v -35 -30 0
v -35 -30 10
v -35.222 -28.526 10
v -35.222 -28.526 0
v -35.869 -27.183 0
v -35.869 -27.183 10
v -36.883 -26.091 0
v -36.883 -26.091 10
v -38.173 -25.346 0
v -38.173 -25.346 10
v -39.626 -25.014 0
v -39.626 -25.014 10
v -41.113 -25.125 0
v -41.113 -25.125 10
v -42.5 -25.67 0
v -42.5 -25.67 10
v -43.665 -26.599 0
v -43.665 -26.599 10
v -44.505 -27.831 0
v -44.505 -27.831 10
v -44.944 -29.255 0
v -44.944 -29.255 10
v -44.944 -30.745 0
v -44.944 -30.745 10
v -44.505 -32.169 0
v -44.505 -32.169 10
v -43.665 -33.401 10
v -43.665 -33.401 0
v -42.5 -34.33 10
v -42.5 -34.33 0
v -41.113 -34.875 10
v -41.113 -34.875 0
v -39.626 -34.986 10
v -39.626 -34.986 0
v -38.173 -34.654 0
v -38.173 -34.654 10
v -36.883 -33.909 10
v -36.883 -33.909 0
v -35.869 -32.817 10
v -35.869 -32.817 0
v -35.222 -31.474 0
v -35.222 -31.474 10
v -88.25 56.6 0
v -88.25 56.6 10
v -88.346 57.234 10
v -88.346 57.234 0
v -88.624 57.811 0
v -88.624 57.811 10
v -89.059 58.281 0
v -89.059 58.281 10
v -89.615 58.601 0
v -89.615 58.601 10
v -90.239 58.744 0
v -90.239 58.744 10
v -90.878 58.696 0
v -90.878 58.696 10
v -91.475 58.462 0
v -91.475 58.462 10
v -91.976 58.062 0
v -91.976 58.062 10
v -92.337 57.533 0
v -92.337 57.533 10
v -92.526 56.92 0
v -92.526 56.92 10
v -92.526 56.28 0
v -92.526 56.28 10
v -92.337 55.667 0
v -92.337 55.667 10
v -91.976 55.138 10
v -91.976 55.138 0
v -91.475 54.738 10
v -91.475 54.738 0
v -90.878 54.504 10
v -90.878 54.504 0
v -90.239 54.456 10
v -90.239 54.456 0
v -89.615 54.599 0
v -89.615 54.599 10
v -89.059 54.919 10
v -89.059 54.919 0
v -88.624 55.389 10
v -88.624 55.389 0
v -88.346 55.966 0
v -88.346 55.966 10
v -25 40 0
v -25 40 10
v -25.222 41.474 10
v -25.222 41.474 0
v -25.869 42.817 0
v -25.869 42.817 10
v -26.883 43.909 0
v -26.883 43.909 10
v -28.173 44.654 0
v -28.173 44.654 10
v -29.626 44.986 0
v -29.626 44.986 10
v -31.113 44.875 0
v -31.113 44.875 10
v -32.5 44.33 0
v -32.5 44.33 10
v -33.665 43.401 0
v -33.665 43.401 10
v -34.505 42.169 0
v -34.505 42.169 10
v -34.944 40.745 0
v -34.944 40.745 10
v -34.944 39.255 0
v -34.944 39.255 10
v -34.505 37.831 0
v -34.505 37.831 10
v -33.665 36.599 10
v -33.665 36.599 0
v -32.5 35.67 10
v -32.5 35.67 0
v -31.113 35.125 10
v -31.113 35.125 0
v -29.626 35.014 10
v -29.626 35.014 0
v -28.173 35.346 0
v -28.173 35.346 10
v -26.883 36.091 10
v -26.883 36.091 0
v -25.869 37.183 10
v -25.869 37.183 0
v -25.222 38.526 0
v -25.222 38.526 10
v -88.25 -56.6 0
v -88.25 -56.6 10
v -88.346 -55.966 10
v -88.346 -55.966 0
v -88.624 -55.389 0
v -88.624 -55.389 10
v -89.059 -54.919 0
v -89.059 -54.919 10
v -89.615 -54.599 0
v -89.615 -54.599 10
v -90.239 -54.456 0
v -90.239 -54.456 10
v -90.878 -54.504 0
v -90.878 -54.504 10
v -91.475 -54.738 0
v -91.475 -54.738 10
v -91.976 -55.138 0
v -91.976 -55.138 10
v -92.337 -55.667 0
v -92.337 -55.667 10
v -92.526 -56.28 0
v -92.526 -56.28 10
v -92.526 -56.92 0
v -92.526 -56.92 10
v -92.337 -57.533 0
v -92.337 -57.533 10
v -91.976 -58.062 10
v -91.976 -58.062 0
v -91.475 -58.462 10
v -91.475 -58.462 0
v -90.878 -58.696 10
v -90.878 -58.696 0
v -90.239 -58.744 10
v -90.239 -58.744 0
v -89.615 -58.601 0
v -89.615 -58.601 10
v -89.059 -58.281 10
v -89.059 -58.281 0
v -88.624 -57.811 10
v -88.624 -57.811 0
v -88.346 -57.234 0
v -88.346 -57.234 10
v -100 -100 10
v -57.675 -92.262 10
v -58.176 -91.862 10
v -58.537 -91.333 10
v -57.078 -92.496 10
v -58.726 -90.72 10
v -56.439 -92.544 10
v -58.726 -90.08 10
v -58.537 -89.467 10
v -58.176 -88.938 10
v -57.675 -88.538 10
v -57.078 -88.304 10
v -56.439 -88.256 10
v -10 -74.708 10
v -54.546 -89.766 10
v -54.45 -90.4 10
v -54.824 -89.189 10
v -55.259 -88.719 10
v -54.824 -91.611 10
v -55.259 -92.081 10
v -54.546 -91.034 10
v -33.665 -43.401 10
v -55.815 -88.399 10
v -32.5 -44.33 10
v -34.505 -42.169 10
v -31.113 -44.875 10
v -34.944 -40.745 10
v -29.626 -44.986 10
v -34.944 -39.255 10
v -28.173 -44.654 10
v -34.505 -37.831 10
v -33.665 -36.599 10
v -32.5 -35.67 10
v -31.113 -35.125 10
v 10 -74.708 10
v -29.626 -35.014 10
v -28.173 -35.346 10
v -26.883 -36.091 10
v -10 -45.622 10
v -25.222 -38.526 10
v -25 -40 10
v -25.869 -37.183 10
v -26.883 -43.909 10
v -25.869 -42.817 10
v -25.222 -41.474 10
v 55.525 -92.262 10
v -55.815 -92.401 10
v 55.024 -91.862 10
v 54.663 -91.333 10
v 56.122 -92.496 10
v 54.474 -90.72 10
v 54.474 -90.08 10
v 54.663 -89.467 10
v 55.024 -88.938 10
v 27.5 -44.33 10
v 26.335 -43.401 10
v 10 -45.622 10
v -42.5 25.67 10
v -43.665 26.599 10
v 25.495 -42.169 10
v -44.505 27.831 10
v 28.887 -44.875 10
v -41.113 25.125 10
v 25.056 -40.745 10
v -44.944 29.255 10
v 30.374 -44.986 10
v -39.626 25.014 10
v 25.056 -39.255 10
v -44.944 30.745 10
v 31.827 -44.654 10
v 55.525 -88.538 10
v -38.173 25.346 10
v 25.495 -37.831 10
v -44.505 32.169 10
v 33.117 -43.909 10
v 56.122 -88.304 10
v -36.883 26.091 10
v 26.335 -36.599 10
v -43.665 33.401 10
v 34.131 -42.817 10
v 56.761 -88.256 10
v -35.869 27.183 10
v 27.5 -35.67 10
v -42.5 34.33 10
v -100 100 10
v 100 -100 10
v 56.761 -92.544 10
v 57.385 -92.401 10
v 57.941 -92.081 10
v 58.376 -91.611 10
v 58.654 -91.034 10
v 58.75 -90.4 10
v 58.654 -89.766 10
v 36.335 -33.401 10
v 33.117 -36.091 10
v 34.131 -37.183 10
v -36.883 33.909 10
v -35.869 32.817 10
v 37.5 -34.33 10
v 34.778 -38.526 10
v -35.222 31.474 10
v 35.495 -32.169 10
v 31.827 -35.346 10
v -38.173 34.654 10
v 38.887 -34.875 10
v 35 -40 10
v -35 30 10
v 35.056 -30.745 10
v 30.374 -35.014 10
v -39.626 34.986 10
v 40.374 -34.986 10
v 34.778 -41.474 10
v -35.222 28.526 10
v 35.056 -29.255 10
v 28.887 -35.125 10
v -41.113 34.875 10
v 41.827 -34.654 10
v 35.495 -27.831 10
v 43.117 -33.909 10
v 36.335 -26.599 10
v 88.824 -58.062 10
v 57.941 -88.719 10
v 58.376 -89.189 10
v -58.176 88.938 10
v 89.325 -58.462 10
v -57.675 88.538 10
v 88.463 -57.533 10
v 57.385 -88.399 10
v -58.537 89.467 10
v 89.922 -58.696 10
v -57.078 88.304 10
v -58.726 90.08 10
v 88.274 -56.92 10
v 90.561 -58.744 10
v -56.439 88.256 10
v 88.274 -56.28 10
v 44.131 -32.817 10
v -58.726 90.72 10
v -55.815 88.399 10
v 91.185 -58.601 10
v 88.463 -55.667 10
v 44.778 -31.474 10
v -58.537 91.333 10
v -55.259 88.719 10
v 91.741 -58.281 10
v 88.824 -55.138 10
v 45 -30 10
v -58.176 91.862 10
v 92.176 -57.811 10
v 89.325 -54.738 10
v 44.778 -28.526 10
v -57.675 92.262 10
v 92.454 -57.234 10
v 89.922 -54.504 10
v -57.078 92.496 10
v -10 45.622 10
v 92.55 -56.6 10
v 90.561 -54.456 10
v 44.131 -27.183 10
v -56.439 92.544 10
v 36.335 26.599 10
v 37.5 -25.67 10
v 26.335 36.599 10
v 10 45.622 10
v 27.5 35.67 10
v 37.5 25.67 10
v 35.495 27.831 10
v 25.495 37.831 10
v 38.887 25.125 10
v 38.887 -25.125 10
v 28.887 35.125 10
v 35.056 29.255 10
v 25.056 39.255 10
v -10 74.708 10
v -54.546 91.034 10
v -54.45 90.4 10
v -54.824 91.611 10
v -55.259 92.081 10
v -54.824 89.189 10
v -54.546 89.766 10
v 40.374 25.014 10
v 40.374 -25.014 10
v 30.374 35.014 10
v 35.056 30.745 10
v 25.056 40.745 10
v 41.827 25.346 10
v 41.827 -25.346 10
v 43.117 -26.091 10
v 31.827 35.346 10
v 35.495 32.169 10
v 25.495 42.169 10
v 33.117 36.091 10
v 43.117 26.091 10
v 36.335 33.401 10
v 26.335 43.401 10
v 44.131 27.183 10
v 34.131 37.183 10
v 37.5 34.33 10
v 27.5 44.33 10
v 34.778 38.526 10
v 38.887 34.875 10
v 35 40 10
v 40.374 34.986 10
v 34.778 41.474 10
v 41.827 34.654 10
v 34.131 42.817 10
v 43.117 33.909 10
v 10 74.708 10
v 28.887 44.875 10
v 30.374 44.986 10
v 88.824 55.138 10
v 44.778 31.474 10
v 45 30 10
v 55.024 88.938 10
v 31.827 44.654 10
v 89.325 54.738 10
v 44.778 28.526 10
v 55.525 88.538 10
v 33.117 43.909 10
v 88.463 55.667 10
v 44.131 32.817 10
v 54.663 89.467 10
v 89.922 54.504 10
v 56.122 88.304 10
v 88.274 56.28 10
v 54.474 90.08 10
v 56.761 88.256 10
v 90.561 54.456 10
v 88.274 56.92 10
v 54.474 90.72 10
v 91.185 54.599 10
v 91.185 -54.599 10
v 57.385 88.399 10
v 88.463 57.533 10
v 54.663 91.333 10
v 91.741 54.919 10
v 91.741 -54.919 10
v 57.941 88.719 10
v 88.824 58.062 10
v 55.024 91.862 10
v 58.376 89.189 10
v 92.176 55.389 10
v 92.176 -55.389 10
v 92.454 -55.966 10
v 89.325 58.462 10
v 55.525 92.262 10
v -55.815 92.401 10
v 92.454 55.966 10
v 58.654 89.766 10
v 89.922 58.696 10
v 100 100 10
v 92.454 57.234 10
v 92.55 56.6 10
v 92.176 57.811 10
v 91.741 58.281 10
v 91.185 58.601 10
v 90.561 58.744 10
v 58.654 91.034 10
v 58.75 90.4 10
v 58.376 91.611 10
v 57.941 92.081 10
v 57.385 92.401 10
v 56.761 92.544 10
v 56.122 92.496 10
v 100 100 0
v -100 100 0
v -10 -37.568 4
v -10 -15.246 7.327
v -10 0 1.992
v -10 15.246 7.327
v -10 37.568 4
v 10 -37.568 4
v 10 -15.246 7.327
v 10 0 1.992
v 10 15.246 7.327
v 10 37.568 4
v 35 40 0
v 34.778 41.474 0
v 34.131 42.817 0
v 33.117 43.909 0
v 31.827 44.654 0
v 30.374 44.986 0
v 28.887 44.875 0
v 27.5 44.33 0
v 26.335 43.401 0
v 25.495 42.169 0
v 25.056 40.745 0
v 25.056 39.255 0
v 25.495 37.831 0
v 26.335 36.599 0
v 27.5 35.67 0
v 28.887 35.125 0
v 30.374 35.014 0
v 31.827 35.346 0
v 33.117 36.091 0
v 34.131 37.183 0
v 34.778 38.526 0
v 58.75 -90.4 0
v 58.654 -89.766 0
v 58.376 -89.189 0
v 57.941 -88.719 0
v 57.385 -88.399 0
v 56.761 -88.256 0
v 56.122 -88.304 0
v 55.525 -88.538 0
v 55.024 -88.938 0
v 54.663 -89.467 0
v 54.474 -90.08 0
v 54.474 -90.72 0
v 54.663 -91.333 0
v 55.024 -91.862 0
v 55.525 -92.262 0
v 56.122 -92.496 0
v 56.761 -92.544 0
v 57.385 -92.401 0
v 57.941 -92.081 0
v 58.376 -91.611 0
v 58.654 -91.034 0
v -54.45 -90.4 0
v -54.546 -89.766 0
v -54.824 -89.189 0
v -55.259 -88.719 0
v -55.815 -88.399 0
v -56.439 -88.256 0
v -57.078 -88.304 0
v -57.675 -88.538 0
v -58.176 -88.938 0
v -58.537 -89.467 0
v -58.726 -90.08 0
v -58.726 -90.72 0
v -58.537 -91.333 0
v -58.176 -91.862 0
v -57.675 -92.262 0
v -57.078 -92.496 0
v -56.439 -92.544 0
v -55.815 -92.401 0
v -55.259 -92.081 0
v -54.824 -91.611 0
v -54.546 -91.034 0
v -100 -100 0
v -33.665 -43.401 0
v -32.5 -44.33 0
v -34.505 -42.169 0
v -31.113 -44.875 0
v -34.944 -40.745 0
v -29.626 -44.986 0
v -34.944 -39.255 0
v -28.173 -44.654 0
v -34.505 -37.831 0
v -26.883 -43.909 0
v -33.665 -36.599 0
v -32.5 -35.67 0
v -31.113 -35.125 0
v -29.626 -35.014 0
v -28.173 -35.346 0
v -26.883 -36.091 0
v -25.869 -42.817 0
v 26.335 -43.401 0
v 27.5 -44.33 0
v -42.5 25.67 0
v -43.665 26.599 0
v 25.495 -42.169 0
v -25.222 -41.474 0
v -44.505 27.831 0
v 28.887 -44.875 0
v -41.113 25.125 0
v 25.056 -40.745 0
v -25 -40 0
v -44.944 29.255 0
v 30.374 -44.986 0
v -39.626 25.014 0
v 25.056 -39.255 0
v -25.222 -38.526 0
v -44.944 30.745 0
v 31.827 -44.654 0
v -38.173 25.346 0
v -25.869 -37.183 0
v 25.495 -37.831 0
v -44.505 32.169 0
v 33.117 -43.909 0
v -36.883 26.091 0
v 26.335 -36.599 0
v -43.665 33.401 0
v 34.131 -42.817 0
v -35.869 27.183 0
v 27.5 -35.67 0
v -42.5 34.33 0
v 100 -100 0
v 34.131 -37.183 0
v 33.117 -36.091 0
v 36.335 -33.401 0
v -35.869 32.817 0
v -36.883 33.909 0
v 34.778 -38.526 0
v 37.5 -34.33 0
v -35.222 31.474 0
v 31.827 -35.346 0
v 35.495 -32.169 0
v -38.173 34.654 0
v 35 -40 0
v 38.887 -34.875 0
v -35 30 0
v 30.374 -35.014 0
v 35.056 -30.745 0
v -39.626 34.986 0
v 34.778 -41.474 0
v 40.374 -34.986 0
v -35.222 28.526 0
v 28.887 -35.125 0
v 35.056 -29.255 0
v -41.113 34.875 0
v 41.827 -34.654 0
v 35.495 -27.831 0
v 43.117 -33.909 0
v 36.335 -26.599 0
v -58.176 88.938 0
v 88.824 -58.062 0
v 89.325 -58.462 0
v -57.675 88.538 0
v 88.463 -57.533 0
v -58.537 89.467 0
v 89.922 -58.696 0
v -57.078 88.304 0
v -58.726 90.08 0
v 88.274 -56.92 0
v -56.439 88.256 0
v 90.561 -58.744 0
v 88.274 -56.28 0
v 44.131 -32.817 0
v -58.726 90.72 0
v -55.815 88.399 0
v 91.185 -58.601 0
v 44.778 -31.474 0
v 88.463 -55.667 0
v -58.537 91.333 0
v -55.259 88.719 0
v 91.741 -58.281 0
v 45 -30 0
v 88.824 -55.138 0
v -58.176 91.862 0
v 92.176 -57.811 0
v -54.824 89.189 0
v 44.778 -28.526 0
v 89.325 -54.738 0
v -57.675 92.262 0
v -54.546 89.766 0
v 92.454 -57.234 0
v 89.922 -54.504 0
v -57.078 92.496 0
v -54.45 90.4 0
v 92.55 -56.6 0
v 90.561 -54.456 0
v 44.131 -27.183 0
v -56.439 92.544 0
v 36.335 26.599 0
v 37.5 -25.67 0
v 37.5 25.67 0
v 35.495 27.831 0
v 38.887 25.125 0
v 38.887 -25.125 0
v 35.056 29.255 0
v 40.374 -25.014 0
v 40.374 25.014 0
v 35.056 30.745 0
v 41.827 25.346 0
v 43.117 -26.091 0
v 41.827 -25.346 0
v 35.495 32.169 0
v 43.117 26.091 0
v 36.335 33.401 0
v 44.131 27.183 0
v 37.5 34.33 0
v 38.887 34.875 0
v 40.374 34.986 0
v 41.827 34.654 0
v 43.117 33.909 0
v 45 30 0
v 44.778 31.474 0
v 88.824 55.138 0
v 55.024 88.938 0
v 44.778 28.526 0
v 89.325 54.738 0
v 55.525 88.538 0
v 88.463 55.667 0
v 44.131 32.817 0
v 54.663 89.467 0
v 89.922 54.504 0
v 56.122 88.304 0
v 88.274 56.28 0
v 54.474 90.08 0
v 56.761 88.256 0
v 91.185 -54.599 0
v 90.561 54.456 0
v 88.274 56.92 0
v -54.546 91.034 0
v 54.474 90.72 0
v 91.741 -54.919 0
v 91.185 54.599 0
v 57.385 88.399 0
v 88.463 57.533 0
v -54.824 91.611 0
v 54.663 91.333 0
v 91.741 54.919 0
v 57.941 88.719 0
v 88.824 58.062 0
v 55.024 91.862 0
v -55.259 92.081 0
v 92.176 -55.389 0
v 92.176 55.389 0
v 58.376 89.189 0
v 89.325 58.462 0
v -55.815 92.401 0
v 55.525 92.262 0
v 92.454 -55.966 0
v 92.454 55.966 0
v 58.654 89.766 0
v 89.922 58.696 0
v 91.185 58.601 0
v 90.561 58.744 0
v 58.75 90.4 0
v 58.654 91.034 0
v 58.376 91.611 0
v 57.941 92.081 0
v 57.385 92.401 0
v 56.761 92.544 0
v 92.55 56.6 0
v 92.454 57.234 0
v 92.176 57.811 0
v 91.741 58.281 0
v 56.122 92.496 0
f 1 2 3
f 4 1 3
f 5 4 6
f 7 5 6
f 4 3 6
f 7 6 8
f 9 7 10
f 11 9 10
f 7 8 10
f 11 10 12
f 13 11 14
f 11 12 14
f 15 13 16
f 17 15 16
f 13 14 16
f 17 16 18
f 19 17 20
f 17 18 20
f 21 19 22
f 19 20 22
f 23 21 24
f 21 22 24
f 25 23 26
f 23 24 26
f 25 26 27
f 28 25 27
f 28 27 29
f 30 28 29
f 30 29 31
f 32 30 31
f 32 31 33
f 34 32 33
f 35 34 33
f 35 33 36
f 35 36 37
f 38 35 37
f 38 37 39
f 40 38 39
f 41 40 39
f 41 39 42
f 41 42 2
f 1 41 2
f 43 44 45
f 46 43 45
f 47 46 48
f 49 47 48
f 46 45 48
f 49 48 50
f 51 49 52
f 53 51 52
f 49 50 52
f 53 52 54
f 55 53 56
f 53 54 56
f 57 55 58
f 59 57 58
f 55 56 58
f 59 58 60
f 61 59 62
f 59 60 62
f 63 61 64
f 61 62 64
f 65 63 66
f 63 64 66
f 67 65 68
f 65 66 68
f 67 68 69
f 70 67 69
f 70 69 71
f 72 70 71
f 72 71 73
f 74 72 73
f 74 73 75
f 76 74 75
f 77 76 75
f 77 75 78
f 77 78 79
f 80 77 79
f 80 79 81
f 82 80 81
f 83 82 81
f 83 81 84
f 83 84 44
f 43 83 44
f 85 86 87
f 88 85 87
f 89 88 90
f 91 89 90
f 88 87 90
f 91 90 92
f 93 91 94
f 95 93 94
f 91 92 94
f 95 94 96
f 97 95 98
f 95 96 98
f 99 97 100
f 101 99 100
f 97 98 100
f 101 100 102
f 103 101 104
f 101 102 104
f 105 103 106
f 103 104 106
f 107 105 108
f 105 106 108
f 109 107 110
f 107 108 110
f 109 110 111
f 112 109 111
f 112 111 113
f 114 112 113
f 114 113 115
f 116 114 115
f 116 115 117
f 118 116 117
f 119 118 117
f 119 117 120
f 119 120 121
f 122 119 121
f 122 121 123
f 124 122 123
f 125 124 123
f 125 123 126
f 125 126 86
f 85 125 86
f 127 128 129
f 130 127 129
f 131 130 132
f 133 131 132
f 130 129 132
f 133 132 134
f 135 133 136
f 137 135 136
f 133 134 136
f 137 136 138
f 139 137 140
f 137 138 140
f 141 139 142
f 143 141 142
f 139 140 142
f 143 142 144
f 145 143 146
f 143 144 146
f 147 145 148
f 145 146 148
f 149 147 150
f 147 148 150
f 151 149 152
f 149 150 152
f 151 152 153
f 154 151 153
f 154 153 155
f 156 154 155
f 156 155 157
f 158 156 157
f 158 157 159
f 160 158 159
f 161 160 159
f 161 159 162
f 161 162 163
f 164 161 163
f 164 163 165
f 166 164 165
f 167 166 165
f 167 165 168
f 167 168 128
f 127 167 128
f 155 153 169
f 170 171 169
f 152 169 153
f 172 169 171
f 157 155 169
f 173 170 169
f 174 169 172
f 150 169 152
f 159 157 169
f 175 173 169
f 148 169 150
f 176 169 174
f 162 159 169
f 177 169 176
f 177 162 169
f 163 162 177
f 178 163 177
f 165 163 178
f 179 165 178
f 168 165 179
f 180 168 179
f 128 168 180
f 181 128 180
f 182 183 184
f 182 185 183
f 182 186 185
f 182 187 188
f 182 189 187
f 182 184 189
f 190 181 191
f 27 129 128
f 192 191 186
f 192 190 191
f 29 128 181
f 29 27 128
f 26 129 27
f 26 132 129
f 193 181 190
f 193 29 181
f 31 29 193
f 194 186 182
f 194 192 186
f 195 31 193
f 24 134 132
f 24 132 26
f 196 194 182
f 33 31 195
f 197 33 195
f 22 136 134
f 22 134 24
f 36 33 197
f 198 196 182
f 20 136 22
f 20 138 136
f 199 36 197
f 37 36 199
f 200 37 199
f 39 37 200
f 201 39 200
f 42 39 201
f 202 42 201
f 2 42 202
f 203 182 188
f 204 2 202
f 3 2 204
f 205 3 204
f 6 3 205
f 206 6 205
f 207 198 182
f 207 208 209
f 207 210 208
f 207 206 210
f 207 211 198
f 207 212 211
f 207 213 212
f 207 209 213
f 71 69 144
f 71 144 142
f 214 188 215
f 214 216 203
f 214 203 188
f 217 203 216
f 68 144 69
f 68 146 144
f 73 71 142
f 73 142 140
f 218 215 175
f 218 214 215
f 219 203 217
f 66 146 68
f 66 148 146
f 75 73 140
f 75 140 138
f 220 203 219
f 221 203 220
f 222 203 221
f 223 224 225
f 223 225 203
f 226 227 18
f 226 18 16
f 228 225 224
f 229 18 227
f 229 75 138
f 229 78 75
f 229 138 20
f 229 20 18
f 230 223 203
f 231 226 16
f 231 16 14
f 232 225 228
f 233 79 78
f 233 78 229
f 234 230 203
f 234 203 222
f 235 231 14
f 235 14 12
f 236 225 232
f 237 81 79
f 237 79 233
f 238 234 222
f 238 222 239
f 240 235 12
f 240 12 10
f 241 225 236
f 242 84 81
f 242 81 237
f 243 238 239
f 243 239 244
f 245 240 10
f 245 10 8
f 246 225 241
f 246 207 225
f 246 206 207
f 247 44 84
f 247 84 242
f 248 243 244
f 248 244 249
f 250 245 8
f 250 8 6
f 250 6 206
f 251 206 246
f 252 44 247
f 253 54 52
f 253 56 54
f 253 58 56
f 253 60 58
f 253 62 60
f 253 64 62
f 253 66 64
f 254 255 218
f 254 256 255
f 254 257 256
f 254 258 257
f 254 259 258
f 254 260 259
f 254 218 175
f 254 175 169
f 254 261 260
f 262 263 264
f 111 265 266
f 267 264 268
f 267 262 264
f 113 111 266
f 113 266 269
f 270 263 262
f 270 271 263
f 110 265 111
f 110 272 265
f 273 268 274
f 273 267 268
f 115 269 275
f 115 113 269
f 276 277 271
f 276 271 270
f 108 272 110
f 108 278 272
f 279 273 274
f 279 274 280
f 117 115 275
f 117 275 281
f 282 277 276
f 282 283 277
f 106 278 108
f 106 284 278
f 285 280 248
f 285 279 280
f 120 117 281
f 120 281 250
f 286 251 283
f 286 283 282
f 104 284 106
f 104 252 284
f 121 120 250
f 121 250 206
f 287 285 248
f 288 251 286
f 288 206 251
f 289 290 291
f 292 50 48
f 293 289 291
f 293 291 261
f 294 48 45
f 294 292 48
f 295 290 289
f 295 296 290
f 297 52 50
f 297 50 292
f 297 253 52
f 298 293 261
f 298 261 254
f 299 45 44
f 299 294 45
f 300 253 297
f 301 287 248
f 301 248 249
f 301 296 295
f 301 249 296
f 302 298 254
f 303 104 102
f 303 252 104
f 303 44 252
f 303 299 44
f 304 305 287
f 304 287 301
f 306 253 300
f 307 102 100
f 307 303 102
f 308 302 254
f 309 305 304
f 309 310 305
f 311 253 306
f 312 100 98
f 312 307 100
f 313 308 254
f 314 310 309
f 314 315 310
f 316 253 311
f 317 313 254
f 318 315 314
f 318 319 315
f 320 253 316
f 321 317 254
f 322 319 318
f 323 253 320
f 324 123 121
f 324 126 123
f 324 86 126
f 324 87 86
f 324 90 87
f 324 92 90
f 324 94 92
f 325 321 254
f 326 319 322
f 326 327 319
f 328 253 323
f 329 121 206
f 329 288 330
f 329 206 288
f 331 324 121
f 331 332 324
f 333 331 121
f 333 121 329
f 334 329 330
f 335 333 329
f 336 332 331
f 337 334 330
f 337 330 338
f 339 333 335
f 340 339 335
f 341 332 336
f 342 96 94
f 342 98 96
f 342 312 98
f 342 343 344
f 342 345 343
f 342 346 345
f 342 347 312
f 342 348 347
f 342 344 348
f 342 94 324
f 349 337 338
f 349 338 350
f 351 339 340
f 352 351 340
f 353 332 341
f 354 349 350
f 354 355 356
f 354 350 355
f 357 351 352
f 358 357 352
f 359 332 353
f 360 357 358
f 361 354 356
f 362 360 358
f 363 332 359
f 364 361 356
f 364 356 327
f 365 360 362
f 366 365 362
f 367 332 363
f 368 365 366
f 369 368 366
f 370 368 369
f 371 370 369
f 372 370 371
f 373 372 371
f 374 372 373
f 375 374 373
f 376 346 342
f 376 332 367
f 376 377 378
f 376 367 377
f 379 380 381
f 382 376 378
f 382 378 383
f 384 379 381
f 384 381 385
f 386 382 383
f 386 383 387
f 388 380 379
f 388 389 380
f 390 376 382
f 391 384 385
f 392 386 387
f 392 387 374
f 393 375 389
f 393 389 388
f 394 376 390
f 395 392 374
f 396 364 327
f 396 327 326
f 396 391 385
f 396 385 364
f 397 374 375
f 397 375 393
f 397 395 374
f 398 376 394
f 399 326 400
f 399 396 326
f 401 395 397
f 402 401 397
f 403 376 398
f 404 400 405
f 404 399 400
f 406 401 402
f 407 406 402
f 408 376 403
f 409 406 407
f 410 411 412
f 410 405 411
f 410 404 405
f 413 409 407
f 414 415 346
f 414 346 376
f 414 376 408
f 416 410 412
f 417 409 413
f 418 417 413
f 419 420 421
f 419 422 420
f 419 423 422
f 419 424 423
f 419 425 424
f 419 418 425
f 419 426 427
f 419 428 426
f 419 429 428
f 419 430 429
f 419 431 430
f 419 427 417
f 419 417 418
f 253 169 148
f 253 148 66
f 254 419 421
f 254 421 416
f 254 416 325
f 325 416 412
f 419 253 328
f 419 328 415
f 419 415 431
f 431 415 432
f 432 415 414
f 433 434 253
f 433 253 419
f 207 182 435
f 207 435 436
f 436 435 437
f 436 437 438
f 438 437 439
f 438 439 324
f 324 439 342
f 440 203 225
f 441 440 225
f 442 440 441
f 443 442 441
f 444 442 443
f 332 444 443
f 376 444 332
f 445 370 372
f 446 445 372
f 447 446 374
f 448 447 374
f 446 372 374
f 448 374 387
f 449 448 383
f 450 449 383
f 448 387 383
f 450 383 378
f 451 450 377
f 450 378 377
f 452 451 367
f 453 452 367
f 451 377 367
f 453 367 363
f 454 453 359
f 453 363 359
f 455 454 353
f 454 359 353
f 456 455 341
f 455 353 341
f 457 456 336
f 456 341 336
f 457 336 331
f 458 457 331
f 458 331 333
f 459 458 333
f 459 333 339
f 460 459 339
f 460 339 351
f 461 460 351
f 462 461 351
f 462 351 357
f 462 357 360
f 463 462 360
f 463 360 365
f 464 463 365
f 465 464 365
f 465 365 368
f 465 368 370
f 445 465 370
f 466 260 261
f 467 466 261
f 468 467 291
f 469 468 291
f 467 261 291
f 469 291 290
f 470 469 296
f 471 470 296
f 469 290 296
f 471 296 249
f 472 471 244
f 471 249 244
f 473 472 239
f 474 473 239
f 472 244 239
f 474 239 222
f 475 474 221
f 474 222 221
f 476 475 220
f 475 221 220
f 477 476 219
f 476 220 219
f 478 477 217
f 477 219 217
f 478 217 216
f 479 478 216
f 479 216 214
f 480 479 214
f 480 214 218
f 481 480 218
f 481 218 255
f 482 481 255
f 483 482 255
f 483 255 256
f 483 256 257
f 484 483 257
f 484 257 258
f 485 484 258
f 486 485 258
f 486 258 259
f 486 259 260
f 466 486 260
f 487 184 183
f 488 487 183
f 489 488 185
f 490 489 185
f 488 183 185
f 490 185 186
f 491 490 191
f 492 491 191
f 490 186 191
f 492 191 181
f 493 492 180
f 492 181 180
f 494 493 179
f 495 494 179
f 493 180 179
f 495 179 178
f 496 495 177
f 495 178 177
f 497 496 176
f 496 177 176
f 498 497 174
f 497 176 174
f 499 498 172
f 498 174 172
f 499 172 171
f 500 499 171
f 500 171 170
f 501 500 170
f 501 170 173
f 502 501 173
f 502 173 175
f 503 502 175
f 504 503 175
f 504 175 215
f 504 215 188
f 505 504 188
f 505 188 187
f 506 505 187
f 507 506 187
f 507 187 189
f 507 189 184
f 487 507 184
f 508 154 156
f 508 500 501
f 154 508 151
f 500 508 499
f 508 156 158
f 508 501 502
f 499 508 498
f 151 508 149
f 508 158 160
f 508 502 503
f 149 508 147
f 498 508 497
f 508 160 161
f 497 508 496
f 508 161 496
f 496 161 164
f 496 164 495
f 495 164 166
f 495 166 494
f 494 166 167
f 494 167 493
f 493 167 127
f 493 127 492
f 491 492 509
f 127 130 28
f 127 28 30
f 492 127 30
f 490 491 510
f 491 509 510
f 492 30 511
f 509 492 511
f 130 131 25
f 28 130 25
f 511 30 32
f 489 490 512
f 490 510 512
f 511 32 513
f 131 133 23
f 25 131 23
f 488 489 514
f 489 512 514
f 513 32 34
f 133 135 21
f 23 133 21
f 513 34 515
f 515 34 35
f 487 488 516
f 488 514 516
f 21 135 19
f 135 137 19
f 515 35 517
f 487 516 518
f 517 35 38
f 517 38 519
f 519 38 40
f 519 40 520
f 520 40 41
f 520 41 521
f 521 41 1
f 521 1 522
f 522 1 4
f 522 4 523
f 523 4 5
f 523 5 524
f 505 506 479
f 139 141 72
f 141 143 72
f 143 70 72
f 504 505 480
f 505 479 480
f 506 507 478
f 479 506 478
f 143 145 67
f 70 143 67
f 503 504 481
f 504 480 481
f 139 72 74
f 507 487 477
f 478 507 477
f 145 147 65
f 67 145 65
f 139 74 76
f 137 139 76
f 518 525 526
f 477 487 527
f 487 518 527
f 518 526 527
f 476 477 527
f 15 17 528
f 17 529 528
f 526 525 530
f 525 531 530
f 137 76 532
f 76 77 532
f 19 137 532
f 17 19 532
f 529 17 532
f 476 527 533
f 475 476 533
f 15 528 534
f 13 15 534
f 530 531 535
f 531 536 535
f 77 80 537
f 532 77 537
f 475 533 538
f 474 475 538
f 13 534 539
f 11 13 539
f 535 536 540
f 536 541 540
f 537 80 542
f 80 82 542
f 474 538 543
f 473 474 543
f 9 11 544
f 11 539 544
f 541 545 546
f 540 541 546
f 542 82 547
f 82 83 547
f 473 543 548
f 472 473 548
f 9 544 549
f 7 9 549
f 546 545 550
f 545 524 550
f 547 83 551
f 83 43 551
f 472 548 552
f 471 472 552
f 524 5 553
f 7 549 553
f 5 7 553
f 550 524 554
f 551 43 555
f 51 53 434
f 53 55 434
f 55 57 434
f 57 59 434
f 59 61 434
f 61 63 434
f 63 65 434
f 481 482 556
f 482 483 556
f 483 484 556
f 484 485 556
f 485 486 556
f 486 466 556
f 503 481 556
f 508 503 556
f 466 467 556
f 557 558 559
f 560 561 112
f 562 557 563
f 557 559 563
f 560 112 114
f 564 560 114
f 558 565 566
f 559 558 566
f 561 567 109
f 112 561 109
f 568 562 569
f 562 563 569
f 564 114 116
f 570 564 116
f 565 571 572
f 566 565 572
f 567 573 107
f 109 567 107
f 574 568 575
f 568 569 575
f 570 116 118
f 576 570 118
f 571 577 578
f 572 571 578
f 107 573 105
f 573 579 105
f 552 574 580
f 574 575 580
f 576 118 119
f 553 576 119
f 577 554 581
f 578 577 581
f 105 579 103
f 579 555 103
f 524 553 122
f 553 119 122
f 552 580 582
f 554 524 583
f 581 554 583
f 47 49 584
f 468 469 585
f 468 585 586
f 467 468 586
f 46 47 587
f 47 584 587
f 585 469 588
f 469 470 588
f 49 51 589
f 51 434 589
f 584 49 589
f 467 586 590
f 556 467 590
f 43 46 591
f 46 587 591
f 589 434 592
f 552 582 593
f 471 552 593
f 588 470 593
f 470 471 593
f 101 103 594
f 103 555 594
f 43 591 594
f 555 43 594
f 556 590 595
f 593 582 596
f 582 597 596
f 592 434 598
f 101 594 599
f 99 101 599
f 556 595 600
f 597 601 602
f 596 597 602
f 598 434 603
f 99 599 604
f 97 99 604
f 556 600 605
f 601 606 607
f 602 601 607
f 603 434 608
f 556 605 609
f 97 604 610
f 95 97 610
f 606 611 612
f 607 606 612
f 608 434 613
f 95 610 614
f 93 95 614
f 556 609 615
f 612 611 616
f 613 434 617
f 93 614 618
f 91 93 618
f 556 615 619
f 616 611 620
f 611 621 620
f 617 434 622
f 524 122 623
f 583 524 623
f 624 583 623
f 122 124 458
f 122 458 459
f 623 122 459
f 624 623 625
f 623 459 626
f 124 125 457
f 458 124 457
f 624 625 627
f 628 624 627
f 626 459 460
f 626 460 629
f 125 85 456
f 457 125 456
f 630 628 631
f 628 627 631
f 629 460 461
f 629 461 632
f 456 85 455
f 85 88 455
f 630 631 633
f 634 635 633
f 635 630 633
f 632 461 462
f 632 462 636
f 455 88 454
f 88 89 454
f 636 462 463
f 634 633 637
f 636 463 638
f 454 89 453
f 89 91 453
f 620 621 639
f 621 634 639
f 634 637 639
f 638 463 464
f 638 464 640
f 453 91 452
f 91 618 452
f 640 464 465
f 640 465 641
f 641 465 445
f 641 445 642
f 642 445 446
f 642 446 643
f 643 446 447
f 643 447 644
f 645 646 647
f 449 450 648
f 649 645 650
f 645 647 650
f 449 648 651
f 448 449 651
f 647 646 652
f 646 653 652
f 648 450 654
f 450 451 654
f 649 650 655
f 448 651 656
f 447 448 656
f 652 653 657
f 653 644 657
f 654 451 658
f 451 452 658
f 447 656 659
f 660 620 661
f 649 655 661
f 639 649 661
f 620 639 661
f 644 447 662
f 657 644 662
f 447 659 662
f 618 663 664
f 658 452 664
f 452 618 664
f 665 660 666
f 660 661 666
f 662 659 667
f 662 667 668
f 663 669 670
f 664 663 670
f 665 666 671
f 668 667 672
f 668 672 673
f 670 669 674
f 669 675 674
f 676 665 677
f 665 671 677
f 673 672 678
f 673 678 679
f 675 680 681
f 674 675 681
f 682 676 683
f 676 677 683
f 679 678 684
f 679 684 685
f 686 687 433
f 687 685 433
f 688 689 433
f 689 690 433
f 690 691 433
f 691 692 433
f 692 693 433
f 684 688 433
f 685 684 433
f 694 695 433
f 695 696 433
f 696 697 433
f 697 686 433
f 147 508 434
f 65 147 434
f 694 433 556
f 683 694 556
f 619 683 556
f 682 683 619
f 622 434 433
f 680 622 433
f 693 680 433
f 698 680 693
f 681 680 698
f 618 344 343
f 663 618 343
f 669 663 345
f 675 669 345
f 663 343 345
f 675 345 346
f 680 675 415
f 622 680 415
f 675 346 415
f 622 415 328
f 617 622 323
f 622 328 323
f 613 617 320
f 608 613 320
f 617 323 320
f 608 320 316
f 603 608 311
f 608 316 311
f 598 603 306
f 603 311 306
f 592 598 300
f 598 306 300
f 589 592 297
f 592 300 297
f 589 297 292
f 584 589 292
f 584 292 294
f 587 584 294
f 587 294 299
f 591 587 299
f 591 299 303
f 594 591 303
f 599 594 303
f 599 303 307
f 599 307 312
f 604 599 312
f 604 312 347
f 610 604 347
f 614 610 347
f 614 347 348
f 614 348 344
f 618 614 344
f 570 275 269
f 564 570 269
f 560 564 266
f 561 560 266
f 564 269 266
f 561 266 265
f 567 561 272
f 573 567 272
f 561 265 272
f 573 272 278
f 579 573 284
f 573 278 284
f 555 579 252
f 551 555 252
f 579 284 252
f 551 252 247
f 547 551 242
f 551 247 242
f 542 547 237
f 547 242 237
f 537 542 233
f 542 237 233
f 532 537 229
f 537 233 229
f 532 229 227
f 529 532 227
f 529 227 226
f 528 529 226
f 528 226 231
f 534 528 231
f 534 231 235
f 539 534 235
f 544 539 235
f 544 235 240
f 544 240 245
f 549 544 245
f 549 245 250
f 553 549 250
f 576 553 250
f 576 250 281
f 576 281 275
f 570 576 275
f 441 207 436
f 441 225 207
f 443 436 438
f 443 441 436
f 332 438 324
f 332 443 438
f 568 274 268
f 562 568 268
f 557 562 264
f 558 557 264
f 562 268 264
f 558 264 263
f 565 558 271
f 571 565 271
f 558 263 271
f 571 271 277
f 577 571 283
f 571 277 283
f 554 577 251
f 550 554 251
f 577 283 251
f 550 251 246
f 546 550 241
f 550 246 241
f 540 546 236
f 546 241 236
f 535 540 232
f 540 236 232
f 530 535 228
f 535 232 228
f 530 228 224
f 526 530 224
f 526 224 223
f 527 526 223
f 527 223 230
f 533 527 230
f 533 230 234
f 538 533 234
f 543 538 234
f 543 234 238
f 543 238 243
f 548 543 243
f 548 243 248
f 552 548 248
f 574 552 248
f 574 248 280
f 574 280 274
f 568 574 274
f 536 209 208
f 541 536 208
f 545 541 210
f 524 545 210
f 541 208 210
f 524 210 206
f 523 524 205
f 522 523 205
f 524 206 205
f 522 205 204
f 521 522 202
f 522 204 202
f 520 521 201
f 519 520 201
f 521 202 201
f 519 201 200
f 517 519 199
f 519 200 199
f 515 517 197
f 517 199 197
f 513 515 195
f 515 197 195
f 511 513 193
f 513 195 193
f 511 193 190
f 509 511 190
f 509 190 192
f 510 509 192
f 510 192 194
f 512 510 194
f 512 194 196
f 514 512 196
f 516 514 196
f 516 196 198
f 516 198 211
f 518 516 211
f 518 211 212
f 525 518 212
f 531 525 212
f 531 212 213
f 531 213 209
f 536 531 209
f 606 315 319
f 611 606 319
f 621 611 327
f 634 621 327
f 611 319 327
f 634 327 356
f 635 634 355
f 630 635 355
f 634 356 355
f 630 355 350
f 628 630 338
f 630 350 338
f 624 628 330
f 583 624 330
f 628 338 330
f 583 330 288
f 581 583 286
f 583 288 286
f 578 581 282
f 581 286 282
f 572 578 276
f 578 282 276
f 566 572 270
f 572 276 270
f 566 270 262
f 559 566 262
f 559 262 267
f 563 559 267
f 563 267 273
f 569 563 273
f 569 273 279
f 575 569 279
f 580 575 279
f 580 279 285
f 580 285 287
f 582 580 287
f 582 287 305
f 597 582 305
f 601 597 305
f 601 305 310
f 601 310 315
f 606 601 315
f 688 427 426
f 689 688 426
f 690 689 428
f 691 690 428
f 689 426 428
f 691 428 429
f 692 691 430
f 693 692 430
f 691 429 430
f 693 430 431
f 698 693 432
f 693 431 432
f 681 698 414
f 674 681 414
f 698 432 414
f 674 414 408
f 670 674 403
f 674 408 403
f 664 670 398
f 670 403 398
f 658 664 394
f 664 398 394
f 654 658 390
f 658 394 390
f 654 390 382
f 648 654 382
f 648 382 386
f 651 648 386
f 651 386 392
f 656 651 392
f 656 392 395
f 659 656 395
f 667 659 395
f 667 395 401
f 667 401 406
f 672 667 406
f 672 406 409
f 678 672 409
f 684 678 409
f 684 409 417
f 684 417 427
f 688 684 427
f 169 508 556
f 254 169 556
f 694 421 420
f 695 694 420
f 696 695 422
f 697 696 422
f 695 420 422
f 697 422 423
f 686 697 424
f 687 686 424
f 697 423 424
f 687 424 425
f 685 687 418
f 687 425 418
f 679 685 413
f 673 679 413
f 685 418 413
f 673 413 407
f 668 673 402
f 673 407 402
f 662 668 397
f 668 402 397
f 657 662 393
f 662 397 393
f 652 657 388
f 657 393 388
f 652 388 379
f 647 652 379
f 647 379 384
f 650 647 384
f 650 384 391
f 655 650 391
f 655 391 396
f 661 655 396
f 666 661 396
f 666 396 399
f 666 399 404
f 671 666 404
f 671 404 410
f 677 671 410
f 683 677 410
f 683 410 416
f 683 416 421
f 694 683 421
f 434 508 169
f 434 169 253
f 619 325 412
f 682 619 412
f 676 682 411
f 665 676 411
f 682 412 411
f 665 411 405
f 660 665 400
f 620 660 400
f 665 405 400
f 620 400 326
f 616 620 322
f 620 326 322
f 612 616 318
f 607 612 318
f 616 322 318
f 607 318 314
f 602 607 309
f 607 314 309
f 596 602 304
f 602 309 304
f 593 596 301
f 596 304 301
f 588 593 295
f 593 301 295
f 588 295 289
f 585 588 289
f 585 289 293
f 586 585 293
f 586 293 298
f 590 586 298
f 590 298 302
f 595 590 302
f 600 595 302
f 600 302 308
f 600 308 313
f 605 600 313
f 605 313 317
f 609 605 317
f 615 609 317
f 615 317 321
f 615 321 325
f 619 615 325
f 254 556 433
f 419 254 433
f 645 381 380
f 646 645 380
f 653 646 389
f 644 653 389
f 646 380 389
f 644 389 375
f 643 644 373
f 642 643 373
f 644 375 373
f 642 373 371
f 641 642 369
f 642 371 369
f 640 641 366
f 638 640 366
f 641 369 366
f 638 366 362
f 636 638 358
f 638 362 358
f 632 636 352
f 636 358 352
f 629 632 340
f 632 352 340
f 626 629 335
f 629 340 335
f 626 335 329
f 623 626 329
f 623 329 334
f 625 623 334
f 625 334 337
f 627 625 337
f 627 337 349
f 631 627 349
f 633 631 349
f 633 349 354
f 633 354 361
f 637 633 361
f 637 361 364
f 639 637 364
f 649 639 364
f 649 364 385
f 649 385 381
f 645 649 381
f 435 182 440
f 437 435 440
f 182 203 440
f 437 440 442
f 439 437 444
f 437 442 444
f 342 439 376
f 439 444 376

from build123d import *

# Parameters (mm, degrees)
SKETCH1_W           = 200
SKETCH1_H           = 200
BOSS_EXTRUDE1_DEPTH = 10
SKETCH2_R           = 5
SKETCH2_R_2         = 2.15
CUT_EXTRUDE1_DEPTH  = 142.774468788
SKETCH3_W           = 20
SKETCH3_H           = 5


with BuildPart() as part:
    # Sketch1 → Boss-Extrude1 (new body)
    with BuildSketch(Plane.XY):
        Rectangle(SKETCH1_W, SKETCH1_H)
    extrude(amount=BOSS_EXTRUDE1_DEPTH)

    # Sketch2 → Cut-Extrude1 (cut, through all)
    with BuildSketch(Plane.XY.offset(10)):
        with Locations((-40, 30)):
            Circle(SKETCH2_R)
        with Locations((40, 30)):
            Circle(SKETCH2_R)
        with Locations((40, -30)):
            Circle(SKETCH2_R)
        with Locations((-40, -30)):
            Circle(SKETCH2_R)
        with Locations((-30, 40)):
            Circle(SKETCH2_R)
        with Locations((30, 40)):
            Circle(SKETCH2_R)
        with Locations((30, -40)):
            Circle(SKETCH2_R)
        with Locations((-30, -40)):
            Circle(SKETCH2_R)
        with Locations((-56.6, 90.4)):
            Circle(SKETCH2_R_2)
        with Locations((-90.4, 56.6)):
            Circle(SKETCH2_R_2)
        with Locations((-90.4, -56.6)):
            Circle(SKETCH2_R_2)
        with Locations((-56.6, -90.4)):
            Circle(SKETCH2_R_2)
        with Locations((56.6, -90.4)):
            Circle(SKETCH2_R_2)
        with Locations((90.4, -56.6)):
            Circle(SKETCH2_R_2)
        with Locations((90.4, 56.6)):
            Circle(SKETCH2_R_2)
        with Locations((56.6, 90.4)):
            Circle(SKETCH2_R_2)
    extrude(amount=-CUT_EXTRUDE1_DEPTH, mode=Mode.SUBTRACT)

    # Sketch3 → Cut-Revolve1 (revolve, cut)
    with BuildSketch(Plane(origin=(0, 0, 0), x_dir=(1, 0, 0), z_dir=(0, 1, 0))):
        with Locations((0, -4.492265688)):
            Rectangle(SKETCH3_W, SKETCH3_H)
    revolve(axis=Axis((0, 0, 354.492265688), (1, 0, 0)), mode=Mode.SUBTRACT)


solid = part.part
